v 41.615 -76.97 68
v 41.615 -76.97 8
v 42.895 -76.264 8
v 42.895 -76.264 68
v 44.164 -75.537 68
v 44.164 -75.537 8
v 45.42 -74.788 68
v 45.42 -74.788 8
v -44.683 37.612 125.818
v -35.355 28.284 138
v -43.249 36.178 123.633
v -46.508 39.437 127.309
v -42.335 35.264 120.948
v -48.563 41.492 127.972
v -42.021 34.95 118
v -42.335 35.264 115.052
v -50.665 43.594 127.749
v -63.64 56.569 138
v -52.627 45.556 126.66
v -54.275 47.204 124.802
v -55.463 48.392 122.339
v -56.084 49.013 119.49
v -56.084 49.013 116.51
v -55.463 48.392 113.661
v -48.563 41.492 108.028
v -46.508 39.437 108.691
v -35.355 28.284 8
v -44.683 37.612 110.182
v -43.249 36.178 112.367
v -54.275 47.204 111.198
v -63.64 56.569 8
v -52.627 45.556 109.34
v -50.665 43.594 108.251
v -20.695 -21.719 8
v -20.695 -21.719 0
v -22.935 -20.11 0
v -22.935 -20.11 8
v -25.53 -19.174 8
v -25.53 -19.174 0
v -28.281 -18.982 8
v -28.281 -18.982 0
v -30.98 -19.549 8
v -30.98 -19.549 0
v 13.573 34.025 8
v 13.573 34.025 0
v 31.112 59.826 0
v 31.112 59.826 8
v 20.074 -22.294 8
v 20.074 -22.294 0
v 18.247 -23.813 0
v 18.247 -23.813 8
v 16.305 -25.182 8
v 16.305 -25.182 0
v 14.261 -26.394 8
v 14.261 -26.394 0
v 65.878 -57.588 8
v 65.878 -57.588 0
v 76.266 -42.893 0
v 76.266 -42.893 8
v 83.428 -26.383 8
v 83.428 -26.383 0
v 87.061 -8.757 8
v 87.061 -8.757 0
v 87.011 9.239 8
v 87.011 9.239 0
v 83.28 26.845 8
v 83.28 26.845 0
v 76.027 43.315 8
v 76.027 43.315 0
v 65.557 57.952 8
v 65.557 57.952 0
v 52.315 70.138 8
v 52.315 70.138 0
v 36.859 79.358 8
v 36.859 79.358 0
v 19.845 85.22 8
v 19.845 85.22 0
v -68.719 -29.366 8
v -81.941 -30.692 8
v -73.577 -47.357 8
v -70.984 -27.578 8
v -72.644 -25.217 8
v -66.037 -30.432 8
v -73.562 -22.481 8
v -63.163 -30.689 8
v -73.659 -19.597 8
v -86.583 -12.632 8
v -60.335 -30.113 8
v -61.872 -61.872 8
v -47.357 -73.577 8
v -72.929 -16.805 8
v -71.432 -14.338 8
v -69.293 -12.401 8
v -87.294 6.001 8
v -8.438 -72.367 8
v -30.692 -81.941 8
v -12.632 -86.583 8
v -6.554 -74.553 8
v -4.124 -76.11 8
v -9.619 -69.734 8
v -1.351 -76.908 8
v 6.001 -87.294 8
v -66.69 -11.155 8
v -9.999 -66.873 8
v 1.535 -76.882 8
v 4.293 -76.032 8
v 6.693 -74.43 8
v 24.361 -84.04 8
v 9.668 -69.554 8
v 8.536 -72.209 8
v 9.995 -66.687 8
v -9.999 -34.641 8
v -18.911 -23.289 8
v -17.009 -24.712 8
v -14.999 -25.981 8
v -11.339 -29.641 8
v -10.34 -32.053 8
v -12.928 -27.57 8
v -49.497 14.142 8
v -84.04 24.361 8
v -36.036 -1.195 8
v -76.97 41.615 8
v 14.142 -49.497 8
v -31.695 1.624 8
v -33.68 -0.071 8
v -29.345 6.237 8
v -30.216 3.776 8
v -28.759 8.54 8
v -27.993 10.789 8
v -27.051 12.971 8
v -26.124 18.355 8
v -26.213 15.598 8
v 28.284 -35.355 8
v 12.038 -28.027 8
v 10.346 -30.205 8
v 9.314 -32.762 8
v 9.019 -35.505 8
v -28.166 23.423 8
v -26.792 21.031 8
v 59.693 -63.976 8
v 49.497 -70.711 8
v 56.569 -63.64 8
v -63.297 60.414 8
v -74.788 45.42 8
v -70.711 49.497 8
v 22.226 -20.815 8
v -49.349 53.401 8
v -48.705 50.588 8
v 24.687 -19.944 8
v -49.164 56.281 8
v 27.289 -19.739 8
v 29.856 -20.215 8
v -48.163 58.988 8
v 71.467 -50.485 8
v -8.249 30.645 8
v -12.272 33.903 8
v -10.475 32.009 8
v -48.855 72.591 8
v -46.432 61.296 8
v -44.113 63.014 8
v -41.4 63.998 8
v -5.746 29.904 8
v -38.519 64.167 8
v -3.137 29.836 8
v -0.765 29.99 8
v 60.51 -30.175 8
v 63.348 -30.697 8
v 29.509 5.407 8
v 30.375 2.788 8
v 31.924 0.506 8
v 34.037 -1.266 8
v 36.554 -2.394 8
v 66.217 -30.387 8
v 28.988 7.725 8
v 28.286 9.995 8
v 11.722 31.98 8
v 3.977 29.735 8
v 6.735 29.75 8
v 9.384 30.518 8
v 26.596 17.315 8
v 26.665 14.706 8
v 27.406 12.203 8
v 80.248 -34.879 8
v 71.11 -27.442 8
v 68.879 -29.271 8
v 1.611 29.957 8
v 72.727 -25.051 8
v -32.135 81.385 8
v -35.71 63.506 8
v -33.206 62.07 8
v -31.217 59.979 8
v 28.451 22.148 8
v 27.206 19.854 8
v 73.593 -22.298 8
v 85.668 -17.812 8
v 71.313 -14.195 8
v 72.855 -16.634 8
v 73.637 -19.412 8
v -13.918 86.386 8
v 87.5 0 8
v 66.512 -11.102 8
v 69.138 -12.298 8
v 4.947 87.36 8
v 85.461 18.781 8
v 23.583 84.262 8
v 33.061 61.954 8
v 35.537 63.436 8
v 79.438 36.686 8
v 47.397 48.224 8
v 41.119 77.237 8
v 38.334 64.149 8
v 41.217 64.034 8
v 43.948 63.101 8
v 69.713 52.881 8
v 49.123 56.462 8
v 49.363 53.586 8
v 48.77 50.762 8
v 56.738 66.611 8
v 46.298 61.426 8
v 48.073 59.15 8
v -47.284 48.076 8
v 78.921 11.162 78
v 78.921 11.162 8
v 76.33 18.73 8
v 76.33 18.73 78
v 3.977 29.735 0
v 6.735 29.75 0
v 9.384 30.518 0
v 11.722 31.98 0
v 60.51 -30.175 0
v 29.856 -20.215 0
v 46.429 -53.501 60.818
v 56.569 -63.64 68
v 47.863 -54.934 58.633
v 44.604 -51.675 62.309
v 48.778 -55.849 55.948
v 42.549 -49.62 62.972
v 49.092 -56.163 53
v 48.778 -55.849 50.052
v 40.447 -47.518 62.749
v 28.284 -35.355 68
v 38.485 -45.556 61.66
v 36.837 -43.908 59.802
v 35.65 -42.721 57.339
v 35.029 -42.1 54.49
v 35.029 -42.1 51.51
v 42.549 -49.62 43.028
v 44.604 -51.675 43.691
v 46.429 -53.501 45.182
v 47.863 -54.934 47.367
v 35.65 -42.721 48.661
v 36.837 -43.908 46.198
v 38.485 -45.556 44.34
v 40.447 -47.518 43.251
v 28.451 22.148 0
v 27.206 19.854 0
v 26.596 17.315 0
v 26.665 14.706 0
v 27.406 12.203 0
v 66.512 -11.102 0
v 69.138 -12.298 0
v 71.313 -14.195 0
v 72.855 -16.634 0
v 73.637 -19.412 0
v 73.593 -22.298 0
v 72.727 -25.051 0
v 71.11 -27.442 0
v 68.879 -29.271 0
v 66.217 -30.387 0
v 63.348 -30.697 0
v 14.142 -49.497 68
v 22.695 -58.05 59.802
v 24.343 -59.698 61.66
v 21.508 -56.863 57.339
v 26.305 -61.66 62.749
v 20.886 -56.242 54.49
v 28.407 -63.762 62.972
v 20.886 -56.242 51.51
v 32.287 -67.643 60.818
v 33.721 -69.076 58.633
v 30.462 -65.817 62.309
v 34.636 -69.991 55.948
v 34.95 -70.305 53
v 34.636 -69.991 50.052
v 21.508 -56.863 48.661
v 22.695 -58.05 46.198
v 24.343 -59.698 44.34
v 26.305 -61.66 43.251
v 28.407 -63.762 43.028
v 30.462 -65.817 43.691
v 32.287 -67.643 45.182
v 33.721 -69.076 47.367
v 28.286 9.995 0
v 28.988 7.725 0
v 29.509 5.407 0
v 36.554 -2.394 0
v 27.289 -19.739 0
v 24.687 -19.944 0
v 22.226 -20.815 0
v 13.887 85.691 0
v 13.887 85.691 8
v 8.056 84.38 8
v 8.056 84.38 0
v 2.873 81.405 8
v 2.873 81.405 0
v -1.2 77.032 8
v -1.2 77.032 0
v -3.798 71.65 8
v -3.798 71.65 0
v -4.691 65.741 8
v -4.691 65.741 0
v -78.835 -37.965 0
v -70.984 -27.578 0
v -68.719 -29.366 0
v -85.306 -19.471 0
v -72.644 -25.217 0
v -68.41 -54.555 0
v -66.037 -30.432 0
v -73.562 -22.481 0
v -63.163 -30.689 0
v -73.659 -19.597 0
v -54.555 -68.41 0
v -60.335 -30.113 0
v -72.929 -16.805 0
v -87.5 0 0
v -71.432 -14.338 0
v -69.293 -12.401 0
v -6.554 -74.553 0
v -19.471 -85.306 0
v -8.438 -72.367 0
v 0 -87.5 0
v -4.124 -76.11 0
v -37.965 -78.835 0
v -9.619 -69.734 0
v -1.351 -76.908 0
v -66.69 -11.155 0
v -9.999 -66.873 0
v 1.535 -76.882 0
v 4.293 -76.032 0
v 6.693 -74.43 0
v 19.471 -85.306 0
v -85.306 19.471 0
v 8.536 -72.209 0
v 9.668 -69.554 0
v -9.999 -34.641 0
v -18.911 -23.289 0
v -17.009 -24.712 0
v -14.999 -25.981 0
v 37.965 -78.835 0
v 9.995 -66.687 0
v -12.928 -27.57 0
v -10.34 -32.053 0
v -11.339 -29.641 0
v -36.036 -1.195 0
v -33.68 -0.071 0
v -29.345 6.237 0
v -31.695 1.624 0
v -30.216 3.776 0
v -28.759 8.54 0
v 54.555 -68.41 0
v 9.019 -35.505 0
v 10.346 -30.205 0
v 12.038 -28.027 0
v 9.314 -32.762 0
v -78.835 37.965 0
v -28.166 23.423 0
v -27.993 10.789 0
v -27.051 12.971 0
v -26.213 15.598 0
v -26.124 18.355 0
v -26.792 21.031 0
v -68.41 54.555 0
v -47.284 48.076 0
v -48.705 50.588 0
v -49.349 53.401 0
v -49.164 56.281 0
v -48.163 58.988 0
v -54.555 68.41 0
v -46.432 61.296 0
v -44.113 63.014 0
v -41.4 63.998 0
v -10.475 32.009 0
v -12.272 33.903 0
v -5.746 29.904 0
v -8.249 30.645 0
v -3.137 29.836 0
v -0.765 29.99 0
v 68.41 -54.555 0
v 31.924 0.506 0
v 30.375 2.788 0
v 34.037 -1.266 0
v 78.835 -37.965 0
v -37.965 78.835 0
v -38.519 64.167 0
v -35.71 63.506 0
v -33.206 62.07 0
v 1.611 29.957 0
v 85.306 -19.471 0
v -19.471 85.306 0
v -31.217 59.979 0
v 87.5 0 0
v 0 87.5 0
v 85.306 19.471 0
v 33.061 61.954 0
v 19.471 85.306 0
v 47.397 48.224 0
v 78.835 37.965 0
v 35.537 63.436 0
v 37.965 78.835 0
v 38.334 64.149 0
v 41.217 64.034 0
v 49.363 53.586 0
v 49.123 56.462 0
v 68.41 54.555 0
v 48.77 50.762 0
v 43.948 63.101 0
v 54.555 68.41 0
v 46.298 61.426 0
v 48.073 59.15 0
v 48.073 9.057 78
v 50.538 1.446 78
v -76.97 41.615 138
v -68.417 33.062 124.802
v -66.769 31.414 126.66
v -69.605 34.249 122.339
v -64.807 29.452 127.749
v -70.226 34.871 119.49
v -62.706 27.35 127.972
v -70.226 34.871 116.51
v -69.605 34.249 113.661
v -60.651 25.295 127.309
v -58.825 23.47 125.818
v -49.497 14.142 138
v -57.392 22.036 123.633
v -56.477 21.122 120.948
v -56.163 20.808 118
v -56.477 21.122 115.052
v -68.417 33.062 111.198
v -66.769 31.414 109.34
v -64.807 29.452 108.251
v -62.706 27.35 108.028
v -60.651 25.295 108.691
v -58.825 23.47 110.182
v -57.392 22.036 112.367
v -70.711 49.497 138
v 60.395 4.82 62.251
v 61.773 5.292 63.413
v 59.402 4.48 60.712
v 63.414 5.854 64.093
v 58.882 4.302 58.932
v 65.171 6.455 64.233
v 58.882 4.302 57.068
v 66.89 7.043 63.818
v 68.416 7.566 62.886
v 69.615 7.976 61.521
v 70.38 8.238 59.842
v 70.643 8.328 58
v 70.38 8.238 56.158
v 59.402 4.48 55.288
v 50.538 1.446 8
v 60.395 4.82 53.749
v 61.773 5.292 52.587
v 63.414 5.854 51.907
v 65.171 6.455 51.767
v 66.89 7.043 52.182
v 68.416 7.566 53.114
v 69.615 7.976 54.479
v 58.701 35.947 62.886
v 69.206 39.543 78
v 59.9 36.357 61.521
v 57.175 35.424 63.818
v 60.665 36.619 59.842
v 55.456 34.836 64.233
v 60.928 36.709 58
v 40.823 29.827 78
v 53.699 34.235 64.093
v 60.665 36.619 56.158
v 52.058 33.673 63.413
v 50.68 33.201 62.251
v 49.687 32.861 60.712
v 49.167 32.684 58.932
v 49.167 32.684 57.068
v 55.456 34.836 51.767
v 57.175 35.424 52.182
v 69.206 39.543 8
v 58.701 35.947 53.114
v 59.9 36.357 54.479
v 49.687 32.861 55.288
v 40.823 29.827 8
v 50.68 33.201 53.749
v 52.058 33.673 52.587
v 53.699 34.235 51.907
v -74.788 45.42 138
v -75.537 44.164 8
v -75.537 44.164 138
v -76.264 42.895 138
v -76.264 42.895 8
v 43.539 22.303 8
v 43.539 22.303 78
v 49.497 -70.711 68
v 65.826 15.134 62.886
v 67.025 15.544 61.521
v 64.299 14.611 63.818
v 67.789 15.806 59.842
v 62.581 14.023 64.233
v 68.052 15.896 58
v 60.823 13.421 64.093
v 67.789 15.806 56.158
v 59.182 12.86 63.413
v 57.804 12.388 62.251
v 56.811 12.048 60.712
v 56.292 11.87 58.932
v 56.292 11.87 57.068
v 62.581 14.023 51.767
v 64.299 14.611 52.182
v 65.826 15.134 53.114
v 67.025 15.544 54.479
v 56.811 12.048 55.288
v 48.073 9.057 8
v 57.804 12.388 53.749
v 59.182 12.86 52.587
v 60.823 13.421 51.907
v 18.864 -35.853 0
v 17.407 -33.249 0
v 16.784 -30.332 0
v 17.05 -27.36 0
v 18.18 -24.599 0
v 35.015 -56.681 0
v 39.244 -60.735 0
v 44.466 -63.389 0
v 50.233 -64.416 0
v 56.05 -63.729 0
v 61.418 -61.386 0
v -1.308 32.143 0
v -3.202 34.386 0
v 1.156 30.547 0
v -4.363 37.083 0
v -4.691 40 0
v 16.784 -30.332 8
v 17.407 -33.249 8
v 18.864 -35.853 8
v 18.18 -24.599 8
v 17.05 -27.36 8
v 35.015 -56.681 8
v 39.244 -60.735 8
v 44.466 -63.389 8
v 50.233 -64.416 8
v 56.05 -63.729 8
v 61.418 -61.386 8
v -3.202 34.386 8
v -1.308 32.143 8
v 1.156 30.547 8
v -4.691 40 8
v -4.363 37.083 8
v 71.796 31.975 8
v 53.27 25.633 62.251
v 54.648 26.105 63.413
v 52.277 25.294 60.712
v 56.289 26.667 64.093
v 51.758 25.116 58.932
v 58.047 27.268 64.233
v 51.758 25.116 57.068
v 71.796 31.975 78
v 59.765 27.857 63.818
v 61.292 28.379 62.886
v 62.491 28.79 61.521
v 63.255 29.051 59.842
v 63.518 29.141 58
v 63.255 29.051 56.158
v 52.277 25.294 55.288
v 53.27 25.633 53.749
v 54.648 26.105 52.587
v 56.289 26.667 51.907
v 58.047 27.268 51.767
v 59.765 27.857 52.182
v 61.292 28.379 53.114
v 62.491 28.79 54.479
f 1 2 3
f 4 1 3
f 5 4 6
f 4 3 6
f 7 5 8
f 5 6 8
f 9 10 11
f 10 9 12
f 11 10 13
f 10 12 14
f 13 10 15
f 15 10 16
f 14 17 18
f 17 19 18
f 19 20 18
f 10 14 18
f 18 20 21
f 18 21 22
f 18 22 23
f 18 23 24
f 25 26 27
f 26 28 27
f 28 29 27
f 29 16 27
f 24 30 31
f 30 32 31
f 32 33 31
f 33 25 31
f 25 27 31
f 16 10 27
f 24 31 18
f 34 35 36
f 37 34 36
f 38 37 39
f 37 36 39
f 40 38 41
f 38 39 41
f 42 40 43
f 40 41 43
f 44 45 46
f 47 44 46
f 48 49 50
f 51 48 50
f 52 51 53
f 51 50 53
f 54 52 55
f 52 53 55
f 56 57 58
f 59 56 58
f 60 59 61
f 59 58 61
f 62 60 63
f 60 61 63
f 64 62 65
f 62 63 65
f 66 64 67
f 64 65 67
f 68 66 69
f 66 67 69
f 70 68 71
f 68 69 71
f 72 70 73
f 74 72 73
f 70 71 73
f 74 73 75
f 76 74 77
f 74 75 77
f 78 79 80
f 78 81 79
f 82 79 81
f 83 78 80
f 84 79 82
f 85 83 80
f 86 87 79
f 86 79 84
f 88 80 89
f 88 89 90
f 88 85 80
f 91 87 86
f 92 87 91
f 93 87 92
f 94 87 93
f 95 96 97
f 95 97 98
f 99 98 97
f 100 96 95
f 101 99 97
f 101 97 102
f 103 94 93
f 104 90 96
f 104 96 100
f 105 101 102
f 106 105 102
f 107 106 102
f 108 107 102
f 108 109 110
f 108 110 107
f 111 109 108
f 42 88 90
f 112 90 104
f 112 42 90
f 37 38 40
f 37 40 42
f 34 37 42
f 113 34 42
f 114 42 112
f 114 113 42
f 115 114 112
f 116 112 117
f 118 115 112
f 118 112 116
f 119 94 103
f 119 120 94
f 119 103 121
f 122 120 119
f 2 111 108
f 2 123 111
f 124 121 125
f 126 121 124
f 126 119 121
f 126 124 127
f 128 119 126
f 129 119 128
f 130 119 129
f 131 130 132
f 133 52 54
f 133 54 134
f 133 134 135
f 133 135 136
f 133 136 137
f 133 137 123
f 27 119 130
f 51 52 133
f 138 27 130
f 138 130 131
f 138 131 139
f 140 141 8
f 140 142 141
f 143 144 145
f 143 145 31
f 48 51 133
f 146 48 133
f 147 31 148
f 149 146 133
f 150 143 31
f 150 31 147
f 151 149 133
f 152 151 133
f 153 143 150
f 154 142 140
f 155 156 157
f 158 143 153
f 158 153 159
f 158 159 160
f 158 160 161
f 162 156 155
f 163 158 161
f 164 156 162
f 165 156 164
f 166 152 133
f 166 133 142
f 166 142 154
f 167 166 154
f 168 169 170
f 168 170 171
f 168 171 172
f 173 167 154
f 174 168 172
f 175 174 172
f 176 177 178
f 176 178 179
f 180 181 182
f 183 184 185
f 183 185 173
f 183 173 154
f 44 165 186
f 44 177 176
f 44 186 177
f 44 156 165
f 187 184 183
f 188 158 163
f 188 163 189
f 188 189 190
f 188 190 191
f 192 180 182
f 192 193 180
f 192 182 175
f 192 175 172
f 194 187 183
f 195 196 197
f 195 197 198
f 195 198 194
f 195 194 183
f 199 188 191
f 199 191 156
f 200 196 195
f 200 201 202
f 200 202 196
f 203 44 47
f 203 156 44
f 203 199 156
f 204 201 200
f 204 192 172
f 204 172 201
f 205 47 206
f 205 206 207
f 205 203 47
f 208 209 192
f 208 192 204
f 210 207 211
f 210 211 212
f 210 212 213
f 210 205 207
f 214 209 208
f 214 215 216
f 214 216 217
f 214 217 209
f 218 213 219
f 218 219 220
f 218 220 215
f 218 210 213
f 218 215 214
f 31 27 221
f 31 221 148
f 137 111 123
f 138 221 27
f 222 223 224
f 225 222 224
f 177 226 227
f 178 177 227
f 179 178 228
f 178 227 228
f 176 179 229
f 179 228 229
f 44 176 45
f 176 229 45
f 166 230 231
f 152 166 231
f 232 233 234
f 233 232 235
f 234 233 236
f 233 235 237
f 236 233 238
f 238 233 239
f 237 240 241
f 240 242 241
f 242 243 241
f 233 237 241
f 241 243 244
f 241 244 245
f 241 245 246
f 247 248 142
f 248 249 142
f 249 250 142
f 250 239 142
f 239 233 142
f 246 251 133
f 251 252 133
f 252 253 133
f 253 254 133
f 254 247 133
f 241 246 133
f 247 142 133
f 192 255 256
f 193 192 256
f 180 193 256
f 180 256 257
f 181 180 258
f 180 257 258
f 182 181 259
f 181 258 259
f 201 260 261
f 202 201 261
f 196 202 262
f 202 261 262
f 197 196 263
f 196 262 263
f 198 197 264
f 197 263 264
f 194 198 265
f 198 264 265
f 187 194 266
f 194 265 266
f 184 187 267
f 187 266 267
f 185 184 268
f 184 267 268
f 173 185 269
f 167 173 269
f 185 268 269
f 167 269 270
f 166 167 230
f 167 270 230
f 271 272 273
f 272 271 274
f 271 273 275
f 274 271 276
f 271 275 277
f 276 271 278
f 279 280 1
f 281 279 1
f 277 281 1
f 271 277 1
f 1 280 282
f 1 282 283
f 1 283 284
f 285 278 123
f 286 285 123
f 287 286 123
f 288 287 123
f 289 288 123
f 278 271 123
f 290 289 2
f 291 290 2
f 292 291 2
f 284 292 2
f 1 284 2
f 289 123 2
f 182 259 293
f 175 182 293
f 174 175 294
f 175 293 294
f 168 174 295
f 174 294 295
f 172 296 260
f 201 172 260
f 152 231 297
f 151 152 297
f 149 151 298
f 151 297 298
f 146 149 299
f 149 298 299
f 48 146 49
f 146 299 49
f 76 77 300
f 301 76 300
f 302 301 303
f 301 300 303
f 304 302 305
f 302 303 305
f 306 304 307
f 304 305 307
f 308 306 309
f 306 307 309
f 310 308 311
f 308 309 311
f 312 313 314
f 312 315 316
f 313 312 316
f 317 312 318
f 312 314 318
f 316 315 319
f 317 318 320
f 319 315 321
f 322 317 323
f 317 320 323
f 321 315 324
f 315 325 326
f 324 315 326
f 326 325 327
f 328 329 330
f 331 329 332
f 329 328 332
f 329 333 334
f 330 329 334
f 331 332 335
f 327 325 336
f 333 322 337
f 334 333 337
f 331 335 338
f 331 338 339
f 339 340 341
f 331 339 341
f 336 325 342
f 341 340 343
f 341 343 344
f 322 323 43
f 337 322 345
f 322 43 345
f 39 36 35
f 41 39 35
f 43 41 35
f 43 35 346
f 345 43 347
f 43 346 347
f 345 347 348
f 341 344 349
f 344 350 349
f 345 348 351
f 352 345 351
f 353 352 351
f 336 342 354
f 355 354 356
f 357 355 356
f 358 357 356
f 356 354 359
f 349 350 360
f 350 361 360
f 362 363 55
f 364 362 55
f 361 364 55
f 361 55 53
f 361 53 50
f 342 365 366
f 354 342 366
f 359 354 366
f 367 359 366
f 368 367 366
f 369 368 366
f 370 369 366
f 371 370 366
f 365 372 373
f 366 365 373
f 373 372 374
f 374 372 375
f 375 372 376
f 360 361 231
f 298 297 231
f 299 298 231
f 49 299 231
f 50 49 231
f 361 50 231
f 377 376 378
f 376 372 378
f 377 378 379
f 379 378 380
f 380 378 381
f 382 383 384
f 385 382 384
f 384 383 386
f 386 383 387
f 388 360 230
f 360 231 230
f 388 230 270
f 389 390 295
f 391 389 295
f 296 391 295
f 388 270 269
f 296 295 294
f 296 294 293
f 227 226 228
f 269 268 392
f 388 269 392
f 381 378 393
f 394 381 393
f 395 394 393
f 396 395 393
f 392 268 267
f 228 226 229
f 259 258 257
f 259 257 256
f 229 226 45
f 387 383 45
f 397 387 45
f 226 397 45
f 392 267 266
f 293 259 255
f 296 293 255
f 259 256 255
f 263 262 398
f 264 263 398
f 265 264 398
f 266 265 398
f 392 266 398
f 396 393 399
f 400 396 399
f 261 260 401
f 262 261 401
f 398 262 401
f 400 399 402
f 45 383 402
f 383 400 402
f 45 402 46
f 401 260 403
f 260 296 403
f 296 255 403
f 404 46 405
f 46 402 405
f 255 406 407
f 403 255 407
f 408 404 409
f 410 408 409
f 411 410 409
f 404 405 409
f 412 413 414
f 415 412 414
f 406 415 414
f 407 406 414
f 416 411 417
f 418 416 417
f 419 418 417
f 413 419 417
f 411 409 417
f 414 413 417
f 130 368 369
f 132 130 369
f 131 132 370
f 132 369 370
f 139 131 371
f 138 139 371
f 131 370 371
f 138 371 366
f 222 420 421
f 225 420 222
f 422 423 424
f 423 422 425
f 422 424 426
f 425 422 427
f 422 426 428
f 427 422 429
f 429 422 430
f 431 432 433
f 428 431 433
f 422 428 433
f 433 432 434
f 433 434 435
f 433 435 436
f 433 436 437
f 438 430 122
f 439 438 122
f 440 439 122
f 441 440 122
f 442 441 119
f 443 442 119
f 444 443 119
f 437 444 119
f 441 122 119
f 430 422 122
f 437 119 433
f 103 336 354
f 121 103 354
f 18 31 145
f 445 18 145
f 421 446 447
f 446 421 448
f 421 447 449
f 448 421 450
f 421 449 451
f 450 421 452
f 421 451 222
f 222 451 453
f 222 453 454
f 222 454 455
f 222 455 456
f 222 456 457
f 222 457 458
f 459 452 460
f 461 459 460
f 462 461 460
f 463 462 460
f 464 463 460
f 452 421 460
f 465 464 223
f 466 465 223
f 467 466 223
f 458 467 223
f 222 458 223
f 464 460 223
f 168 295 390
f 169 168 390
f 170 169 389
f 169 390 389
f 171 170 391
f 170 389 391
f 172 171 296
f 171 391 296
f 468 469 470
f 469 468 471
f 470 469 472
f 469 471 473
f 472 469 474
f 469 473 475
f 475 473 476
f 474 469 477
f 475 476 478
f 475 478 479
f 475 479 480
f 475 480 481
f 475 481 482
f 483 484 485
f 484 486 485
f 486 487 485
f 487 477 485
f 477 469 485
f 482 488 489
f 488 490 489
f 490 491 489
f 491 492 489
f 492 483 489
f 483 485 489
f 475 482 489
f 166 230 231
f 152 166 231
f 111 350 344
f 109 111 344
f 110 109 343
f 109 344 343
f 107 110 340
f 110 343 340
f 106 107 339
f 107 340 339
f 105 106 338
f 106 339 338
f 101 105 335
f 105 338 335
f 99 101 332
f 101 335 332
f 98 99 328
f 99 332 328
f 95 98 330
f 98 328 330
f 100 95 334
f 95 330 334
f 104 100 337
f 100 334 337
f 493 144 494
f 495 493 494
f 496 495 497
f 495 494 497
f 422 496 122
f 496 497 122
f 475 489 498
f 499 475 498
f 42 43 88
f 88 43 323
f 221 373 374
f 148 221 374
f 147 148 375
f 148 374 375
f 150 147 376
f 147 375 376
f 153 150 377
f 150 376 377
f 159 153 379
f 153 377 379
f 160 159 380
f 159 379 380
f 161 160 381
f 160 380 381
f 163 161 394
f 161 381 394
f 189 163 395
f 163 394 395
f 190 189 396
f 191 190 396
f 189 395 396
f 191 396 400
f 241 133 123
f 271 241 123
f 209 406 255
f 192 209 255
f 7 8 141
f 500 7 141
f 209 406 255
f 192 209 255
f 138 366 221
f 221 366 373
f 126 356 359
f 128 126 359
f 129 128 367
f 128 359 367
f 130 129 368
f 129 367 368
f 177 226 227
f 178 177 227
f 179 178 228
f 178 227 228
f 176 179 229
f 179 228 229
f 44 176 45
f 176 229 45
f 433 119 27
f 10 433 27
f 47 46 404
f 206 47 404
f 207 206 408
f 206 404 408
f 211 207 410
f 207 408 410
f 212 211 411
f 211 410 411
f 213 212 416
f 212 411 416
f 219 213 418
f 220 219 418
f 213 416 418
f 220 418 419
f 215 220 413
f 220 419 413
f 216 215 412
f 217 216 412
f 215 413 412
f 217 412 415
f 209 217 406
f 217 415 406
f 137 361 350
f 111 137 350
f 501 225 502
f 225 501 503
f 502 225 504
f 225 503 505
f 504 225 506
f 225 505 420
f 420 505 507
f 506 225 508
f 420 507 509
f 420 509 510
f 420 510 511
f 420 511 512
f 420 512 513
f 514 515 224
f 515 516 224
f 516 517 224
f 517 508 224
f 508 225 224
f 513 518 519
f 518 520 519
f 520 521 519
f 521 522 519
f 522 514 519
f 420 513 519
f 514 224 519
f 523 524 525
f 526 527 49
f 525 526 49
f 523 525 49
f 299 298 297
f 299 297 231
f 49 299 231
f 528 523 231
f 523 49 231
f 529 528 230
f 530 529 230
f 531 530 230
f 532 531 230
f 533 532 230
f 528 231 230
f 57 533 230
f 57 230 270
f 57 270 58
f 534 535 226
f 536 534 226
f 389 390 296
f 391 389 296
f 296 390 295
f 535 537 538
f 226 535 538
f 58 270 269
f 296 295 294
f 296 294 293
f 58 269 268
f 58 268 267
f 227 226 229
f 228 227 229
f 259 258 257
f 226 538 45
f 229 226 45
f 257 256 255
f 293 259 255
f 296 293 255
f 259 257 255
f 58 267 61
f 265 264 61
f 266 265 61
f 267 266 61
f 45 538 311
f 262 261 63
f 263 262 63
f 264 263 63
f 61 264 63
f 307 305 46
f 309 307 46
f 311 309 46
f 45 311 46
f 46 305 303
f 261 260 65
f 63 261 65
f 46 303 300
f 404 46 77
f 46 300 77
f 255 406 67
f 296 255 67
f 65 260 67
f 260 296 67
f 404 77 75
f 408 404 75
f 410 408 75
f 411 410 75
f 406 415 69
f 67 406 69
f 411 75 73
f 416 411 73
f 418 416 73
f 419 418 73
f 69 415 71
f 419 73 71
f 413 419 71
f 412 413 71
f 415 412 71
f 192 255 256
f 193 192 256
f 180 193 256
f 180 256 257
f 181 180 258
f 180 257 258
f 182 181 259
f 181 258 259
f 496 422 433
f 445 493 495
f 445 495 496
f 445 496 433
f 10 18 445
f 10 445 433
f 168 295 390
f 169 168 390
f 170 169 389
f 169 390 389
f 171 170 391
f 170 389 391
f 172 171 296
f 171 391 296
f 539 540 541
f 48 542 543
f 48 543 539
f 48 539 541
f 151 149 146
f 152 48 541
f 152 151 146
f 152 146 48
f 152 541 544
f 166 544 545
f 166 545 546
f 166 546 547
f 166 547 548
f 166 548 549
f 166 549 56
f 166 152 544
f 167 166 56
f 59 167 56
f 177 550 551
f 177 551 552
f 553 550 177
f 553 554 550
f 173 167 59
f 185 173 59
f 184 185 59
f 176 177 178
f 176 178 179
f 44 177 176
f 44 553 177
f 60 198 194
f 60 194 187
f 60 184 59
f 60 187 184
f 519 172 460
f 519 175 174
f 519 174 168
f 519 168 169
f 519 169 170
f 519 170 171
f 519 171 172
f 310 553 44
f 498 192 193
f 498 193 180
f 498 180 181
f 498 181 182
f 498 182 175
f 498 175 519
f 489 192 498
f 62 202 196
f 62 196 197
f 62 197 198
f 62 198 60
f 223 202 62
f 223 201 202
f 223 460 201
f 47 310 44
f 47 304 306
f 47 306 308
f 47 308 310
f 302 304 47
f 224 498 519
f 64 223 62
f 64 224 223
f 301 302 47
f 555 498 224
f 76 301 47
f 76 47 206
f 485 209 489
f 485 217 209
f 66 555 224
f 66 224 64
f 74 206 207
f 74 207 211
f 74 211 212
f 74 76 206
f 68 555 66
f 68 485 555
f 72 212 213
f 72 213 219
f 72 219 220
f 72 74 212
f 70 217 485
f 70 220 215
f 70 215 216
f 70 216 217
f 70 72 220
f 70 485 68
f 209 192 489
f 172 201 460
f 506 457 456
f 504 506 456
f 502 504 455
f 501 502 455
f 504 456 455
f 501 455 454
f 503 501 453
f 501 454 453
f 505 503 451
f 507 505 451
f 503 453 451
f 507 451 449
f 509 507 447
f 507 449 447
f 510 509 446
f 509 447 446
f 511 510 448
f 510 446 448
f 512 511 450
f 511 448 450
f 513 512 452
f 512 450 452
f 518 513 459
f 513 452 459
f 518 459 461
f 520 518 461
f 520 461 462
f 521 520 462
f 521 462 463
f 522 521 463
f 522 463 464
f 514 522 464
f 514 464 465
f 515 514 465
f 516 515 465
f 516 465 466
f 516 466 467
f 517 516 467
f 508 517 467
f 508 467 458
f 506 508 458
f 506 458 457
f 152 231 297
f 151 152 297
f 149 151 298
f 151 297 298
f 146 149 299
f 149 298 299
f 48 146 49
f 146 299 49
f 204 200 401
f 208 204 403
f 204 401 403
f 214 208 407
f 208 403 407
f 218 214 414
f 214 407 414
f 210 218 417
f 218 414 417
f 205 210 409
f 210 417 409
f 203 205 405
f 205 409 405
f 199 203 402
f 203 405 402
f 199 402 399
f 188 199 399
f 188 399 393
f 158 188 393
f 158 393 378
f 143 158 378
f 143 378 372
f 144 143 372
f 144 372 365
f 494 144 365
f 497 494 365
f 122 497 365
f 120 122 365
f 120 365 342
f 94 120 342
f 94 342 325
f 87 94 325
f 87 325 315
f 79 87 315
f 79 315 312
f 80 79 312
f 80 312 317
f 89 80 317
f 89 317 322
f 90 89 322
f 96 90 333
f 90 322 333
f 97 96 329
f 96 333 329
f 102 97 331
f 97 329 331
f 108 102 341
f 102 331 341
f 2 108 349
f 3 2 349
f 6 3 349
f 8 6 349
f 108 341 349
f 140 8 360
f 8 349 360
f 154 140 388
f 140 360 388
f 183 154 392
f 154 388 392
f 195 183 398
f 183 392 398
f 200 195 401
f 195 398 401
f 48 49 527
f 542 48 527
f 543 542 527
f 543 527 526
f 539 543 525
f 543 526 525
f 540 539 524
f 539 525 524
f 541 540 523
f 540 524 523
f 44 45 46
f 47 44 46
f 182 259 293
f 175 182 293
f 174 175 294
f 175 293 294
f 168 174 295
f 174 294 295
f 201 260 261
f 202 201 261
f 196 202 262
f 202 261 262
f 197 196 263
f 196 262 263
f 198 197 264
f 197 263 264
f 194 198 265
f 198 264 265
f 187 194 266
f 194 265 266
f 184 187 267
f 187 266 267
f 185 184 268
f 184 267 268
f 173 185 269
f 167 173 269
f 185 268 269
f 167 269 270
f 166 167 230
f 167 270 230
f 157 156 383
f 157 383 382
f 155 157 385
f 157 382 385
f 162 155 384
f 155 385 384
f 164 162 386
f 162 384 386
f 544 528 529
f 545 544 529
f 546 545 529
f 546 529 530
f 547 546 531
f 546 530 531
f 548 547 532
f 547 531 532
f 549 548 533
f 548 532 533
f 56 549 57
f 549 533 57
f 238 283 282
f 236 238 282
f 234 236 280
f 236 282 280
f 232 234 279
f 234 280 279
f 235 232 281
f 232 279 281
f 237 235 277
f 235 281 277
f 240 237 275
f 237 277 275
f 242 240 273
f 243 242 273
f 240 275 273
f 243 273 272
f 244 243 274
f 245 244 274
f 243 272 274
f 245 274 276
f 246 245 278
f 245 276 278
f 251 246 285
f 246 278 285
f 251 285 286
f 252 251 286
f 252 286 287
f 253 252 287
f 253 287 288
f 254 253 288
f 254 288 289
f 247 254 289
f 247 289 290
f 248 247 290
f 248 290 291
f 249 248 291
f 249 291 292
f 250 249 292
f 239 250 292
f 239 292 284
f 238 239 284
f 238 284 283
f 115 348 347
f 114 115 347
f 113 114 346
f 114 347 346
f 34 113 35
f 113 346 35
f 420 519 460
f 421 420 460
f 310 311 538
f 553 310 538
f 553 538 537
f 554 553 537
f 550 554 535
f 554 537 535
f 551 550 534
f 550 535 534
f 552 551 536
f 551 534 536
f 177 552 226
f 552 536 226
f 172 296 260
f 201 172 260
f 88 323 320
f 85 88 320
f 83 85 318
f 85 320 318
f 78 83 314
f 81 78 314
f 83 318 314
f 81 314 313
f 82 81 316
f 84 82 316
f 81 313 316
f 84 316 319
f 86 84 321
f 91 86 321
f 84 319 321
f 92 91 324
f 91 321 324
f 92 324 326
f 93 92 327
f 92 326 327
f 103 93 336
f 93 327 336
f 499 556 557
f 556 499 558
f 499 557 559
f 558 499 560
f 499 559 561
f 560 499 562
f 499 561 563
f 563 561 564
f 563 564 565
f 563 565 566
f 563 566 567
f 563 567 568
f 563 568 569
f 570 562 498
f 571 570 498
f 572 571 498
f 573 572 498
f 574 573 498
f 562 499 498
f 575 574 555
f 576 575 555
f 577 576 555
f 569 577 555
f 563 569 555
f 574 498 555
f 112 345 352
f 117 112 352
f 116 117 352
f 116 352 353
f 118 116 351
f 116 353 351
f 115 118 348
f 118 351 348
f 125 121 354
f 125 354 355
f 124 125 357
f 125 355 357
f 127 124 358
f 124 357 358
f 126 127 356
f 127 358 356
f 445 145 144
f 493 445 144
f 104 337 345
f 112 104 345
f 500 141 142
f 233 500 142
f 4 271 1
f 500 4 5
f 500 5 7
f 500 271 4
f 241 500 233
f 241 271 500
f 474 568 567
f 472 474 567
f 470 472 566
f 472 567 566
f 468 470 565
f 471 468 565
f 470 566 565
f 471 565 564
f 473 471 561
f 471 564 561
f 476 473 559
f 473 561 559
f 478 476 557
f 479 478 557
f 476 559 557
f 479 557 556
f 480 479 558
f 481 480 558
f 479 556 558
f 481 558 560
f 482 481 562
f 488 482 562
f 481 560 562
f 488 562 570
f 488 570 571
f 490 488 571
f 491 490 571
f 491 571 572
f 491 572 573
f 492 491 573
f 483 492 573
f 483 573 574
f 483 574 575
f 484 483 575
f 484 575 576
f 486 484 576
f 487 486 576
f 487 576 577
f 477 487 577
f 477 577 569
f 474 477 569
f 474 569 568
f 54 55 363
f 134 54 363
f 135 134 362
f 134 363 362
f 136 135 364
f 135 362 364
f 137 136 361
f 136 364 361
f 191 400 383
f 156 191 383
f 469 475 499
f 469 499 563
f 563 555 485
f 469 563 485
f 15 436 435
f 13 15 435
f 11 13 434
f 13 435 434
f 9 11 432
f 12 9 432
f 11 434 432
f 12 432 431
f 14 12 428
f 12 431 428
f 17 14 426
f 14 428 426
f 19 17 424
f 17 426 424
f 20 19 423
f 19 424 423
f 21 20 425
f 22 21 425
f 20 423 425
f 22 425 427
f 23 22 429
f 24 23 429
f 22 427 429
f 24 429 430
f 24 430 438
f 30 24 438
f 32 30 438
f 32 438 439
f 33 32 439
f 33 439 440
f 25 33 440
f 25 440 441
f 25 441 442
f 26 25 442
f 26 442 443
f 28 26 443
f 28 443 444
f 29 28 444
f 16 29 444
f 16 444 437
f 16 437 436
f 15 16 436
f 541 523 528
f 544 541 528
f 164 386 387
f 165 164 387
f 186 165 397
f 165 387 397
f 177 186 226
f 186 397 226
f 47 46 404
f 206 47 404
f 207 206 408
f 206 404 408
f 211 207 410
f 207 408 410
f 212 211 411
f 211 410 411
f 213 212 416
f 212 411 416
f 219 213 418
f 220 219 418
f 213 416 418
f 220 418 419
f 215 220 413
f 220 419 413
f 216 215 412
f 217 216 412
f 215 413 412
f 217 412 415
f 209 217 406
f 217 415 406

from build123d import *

# Parameters (mm, degrees)
F0_R      = 87.5
F1_DEPTH  = 8
F3_DEPTH  = 60
F4_DEPTH  = 130
F5_R      = 10
F6_DEPTH  = 148.7446867076
F7_R      = 10
F8_DEPTH  = 148.7446867076
F10_DEPTH = 8
F12_DEPTH = 70
F13_R     = 6.25
F14_DEPTH = 126.1216693821


with BuildPart() as f1:
    # F0 (on Top) → F1 (new body)
    with BuildSketch(Plane.XY):
        Circle(F0_R)
        with BuildLine():
            ThreePointArc((9.9951046903, -66.6871386401), (0.0929727344, -76.9995677942), (-9.9991940145, -66.8730391372))
            Line((-9.9991940145, -66.8730391372), (-9.9991940145, -34.6414814748))
            ThreePointArc((-9.9991940145, -34.6414814748), (-11.3389981438, -29.6413807277), (-14.9993955109, -25.9811111061))
            ThreePointArc((-14.9993955109, -25.9811111061), (-17.9741202524, -24.0193880262), (-20.6952632149, -21.7187955575))
            ThreePointArc((-20.6952632149, -21.7187955575), (-25.5295285859, -19.1737499214), (-30.9798903314, -19.549164107))
            Line((-30.9798903314, -19.549164107), (-60.3345805469, -30.1133685928))
            ThreePointArc((-60.3345805469, -30.1133685928), (-73.2022105476, -23.8825973329), (-66.6899605164, -11.1551069337))
            Line((-66.6899605164, -11.1551069337), (-36.0359275713, -1.1950078609))
            ThreePointArc((-36.0359275713, -1.1950078609), (-31.6945714187, 1.6243376914), (-29.3445731363, 6.2366679766))
            ThreePointArc((-29.3445731363, 6.2366679766), (-28.3981041167, 9.6720050961), (-27.0509900775, 12.9708880124))
            ThreePointArc((-27.0509900775, 12.9708880124), (-26.124377996, 18.355009948), (-28.1656725083, 23.4226026389))
            Line((-28.1656725083, 23.4226026389), (-47.2839261652, 48.076053334))
            ThreePointArc((-47.2839261652, 48.076053334), (-45.3344269045, 62.2393109029), (-31.2174682931, 59.978803904))
            Line((-31.2174682931, 59.978803904), (-12.2722340407, 33.902926))
            ThreePointArc((-12.2722340407, 33.902926), (-8.2493242518, 30.6452766301), (-3.1365480727, 29.8355838922))
            ThreePointArc((-3.1365480727, 29.8355838922), (0.4231266922, 29.997015915), (3.9768319177, 29.7352452134))
            ThreePointArc((3.9768319177, 29.7352452134), (9.3837750494, 30.5177699331), (13.5725474053, 34.0251286428))
            Line((13.5725474053, 34.0251286428), (31.1115070552, 59.8260035981))
            ThreePointArc((31.1115070552, 59.8260035981), (45.1839938601, 62.3486069072), (47.3965040686, 48.224046351))
            Line((47.3965040686, 48.224046351), (28.4512698162, 22.1481684469))
            ThreePointArc((28.4512698162, 22.1481684469), (26.5962086468, 17.3154848607), (27.40607982, 12.202736943))
            ThreePointArc((27.40607982, 12.202736943), (28.659610794, 8.8671703004), (29.5088073701, 5.4065041933))
            ThreePointArc((29.5088073701, 5.4065041933), (31.9238699193, 0.5060091315), (36.5539681187, -2.3939166661))
            Line((36.5539681187, -2.3939166661), (66.5118949666, -11.1015496993))
            ThreePointArc((66.5118949666, -11.1015496993), (73.2596708575, -23.705752683), (60.5101187554, -30.1747041841))
            Line((60.5101187554, -30.1747041841), (29.8560858102, -20.2146051112))
            ThreePointArc((29.8560858102, -20.2146051112), (24.6866851674, -19.9437184545), (20.0744368999, -22.2938777056))
            ThreePointArc((20.0744368999, -22.2938777056), (17.2894868828, -24.5168032853), (14.2606140045, -26.3938418616))
            ThreePointArc((14.2606140045, -26.3938418616), (10.3462616131, -30.2050390912), (9.0190473158, -35.5046505087))
            Line((9.0190473158, -35.5046505087), (9.9951046903, -66.6871386401))
        make_face(mode=Mode.SUBTRACT)
    extrude(amount=F1_DEPTH)

    # F2 (on face) → F3 (join)
    with BuildSketch(Plane.XY.offset(8)):
        with BuildLine():
            Line((45.4199012453, -74.7882515564), (49.4974746831, -70.7106781187))
            Line((49.4974746831, -70.7106781187), (21.2132034356, -42.4264068712))
            Line((21.2132034356, -42.4264068712), (14.1421356237, -49.4974746831))
            Line((14.1421356237, -49.4974746831), (41.6150365985, -76.9703756578))
            ThreePointArc((41.6150365985, -76.9703756578), (43.5311442276, -75.9031585788), (45.4199012453, -74.7882515564))
        make_face()
        Polygon((21.2132034356, -42.4264068712), (49.4974746831, -70.7106781187), (56.5685424949, -63.6396103068), (28.2842712475, -35.3553390593), align=None)
    extrude(amount=F3_DEPTH)

    # F2 (on face) → F4 (join)
    with BuildSketch(Plane.XY.offset(8)):
        with BuildLine():
            ThreePointArc((-74.7882515564, 45.4199012453), (-75.9031585788, 43.5311442276), (-76.9703756578, 41.6150365985))
            Line((-76.9703756578, 41.6150365985), (-49.4974746831, 14.1421356237))
            Line((-49.4974746831, 14.1421356237), (-42.4264068712, 21.2132034356))
            Line((-42.4264068712, 21.2132034356), (-70.7106781187, 49.4974746831))
            Line((-70.7106781187, 49.4974746831), (-74.7882515564, 45.4199012453))
        make_face()
        Polygon((-63.6396103068, 56.5685424949), (-70.7106781187, 49.4974746831), (-42.4264068712, 21.2132034356), (-35.3553390593, 28.2842712475), align=None)
    extrude(amount=F4_DEPTH)

    # F5 (on face) → F6 (cut, through all)
    with BuildSketch(Plane(origin=(-17.6776695297, -17.6776695297, 0), x_dir=(0.7071067812, -0.7071067812, 0), z_dir=(-0.7071067812, -0.7071067812, 0))):
        with Locations((-64.4262745781, 118)):
            Circle(F5_R)
    extrude(amount=-F6_DEPTH, mode=Mode.SUBTRACT)

    # F7 (on face) → F8 (cut, through all)
    with BuildSketch(Plane(origin=(-17.6776695297, -17.6776695297, 0), x_dir=(0.7071067812, -0.7071067812, 0), z_dir=(-0.7071067812, -0.7071067812, 0))):
        with Locations((64.4262745781, 53)):
            Circle(F7_R)
    extrude(amount=-F8_DEPTH, mode=Mode.SUBTRACT)


with BuildPart() as f10:
    # F9 (on Top) → F10 (new body)
    with BuildSketch(Plane.XY):
        with BuildLine():
            ThreePointArc((35.0153574254, -56.6812275064), (50.23259463, -64.4163905672), (65.8777196641, -57.5879853082))
            ThreePointArc((65.8777196641, -57.5879853082), (83.2802837423, 26.8448196082), (19.8445700695, 85.2199685447))
            ThreePointArc((19.8445700695, 85.2199685447), (2.873195582, 81.4050586228), (-4.6913316607, 65.7411185916))
            Line((-4.6913316607, 65.7411185916), (-4.6913316607, 39.9998064404))
            ThreePointArc((-4.6913316607, 39.9998064404), (-2.3377421712, 33.1950499324), (3.9768319177, 29.7352452134))
            ThreePointArc((3.9768319177, 29.7352452134), (9.3837750494, 30.5177699331), (13.5725474053, 34.0251286428))
            Line((13.5725474053, 34.0251286428), (31.1115070552, 59.8260035981))
            ThreePointArc((31.1115070552, 59.8260035981), (45.1839938601, 62.3486069072), (47.3965040686, 48.224046351))
            Line((47.3965040686, 48.224046351), (28.4512698162, 22.1481684469))
            ThreePointArc((28.4512698162, 22.1481684469), (26.5962086468, 17.3154848607), (27.40607982, 12.202736943))
            ThreePointArc((27.40607982, 12.202736943), (28.659610794, 8.8671703004), (29.5088073701, 5.4065041933))
            ThreePointArc((29.5088073701, 5.4065041933), (31.9238699193, 0.5060091315), (36.5539681187, -2.3939166661))
            Line((36.5539681187, -2.3939166661), (66.5118949666, -11.1015496993))
            ThreePointArc((66.5118949666, -11.1015496993), (73.2596708575, -23.705752683), (60.5101187554, -30.1747041841))
            Line((60.5101187554, -30.1747041841), (29.8560858102, -20.2146051112))
            ThreePointArc((29.8560858102, -20.2146051112), (24.6866851674, -19.9437184545), (20.0744368999, -22.2938777056))
            ThreePointArc((20.0744368999, -22.2938777056), (16.8055491856, -28.8357347324), (18.8636169945, -35.8532754085))
            Line((18.8636169945, -35.8532754085), (35.0153574254, -56.6812275064))
        make_face()
    extrude(amount=F10_DEPTH)

    # F11 (on face) → F12 (join)
    with BuildSketch(Plane.XY.offset(8)):
        Polygon((40.8227778183, 29.8271468933), (43.5394204286, 22.3025304294), (71.7964546783, 31.975067943), (69.2059565392, 39.5428643499), align=None)
        Polygon((48.0734219083, 9.0570470264), (50.5377755762, 1.4460706764), (78.9209542971, 11.161788133), (76.330456158, 18.7295845399), align=None)
    extrude(amount=F12_DEPTH)

    # F13 (on face) → F14 (cut, through all)
    with BuildSketch(Plane(origin=(4.857498879, -14.1905381084, 0), x_dir=(0.9461059574, 0.3238572486, 0), z_dir=(0.3238572486, -0.9461059574, 0))):
        with Locations((63.282411015, 58)):
            Circle(F13_R)
    extrude(amount=-F14_DEPTH, mode=Mode.SUBTRACT)


solid = Compound([f1.part, f10.part])
